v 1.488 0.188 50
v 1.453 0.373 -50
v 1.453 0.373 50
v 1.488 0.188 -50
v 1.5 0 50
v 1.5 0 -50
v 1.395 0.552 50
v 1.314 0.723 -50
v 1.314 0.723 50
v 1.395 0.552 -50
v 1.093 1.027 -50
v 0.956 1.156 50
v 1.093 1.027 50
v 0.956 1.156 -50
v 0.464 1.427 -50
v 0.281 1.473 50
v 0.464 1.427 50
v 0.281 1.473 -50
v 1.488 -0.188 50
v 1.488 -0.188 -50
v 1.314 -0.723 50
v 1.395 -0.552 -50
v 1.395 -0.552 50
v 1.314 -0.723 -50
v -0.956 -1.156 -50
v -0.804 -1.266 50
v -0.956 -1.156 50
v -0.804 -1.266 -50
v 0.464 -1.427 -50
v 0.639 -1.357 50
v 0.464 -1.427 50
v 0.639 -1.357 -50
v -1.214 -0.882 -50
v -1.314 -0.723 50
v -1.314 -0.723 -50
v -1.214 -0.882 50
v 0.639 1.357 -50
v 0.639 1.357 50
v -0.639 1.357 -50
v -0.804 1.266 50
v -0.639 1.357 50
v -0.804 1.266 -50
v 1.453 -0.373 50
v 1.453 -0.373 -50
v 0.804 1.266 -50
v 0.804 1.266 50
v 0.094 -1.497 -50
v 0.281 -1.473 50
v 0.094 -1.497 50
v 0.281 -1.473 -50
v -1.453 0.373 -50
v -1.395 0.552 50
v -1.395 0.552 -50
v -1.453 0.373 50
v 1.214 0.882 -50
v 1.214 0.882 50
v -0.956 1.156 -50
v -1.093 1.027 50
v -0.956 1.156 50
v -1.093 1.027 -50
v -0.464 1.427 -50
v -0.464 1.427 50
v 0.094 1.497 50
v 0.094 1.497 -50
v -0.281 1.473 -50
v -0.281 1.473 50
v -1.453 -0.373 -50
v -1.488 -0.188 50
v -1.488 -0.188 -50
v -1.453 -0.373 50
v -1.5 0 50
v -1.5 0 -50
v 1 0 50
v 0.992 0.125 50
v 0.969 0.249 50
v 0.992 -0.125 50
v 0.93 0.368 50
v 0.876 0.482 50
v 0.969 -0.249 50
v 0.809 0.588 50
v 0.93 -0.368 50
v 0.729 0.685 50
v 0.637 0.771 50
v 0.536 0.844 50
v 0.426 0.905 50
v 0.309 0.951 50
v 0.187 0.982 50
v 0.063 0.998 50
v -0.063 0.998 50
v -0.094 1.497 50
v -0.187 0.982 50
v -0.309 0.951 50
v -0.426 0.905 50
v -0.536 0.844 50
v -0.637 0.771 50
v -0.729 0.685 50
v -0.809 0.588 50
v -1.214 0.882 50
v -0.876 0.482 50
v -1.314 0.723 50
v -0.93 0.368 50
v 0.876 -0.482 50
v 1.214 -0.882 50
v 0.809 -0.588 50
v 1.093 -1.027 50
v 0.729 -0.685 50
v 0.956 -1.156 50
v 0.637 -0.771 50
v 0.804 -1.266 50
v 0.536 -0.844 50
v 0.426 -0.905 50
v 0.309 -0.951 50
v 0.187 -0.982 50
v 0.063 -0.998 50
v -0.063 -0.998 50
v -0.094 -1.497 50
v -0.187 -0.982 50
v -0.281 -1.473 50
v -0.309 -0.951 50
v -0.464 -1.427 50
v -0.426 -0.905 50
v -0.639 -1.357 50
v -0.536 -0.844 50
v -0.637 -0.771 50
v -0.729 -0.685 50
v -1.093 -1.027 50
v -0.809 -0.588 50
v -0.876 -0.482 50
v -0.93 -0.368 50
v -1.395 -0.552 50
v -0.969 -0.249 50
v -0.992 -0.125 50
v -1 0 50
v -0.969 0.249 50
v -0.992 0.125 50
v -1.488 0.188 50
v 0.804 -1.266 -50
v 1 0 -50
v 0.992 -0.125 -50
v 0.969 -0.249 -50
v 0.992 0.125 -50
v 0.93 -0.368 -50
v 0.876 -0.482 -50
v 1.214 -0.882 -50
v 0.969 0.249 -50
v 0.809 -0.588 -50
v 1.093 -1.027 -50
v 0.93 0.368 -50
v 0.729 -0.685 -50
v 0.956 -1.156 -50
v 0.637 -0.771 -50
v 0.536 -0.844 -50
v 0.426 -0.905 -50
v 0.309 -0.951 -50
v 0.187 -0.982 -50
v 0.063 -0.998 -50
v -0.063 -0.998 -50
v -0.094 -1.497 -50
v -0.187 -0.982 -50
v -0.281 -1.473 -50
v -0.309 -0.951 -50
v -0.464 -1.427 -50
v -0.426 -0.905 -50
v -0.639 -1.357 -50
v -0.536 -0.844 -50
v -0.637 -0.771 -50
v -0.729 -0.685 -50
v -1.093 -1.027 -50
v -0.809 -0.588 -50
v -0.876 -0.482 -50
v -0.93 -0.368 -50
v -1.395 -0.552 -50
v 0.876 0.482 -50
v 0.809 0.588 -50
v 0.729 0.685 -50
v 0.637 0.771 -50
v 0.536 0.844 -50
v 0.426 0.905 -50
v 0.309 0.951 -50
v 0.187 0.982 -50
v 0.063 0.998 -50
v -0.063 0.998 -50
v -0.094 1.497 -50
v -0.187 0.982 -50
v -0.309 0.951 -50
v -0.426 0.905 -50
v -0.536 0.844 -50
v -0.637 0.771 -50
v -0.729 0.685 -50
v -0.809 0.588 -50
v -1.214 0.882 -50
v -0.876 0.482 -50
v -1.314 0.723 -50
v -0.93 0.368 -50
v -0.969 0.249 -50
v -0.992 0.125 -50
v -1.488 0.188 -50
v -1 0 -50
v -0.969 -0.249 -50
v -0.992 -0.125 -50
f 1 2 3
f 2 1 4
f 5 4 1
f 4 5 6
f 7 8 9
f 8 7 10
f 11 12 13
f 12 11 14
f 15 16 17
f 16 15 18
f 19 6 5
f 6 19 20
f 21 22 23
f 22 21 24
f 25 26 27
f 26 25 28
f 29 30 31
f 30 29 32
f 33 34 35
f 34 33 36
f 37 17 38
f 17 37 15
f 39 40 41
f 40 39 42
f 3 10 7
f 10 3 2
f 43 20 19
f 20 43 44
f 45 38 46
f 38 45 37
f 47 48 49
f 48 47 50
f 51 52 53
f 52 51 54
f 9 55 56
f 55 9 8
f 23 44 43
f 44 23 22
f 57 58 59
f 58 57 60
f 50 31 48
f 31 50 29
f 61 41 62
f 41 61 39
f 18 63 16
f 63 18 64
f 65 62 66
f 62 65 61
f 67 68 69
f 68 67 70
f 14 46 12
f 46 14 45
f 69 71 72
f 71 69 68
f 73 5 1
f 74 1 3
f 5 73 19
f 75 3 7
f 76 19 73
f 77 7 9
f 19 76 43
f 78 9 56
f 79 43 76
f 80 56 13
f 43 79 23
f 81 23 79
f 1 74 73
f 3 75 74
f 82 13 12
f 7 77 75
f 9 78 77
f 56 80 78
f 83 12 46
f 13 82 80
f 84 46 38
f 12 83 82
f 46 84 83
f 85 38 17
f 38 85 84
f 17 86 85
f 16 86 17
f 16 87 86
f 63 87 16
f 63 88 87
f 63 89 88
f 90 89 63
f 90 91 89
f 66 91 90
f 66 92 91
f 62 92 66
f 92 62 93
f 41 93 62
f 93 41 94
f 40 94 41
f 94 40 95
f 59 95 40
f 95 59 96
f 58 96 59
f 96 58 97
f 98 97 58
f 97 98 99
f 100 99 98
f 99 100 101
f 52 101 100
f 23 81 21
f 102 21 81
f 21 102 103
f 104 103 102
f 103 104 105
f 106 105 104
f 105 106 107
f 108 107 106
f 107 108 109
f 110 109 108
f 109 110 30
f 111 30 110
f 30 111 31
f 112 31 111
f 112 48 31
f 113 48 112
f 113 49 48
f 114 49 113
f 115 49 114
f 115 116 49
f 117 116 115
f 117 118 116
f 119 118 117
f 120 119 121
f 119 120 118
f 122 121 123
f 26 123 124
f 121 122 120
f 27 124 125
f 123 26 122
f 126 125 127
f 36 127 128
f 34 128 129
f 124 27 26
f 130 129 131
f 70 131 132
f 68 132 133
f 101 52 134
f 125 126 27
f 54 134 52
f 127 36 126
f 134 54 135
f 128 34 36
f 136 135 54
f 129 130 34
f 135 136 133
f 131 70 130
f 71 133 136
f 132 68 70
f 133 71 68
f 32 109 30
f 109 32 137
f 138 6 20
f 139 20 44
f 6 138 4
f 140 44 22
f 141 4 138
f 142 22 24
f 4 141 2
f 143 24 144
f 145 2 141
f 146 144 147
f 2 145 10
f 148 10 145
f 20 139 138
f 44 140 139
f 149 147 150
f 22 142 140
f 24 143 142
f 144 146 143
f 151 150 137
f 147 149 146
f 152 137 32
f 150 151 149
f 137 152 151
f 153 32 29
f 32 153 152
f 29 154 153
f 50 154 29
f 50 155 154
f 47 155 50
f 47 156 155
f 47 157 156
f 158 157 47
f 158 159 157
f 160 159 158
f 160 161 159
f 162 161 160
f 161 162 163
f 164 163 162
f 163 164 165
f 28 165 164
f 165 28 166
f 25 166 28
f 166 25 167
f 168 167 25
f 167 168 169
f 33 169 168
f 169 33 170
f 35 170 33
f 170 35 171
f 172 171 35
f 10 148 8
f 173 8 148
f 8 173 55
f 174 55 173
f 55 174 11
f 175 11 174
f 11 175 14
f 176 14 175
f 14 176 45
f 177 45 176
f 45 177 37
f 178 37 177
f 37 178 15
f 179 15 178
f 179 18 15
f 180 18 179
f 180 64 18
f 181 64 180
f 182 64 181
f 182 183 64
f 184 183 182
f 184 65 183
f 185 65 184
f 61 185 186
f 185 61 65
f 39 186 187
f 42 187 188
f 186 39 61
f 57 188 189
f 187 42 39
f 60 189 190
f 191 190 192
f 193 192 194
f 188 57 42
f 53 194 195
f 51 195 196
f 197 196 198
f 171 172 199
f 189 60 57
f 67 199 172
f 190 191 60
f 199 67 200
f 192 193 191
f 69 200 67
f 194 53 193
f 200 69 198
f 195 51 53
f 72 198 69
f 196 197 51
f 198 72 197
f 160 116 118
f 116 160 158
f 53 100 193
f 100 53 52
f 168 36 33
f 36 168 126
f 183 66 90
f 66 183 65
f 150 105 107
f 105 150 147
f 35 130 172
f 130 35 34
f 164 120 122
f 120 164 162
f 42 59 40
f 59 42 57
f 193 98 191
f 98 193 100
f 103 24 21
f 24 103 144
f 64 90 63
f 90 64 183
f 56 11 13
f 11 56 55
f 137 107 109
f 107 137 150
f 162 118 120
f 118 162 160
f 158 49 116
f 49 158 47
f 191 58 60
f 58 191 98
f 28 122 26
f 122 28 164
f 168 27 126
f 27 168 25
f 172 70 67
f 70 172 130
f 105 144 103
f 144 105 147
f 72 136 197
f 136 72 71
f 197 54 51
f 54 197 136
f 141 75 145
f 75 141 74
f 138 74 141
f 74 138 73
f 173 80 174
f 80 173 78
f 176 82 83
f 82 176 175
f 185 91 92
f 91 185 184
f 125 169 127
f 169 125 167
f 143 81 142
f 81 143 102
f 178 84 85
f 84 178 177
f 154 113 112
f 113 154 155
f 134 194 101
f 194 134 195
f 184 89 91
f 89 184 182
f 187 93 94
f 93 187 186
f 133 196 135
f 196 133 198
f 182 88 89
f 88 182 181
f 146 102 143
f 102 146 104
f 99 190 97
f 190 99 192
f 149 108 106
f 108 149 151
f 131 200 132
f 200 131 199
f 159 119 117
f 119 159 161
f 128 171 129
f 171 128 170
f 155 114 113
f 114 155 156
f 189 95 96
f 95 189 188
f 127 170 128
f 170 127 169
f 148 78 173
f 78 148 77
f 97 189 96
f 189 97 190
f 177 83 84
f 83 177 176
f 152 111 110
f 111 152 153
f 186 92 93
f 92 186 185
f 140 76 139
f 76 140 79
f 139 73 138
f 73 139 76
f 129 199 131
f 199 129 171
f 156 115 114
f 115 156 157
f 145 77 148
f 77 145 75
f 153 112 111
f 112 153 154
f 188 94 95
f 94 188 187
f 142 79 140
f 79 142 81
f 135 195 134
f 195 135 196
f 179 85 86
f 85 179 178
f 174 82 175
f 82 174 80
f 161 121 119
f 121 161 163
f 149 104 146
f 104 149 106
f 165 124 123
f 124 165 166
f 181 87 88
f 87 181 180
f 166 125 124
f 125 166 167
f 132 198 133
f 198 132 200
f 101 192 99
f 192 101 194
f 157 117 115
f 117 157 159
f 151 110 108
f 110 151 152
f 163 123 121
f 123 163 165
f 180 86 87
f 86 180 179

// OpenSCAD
$fn = 50;


difference() {
	union() {
		translate(v = [0, 0, -50.0000000000]) {
			cylinder(h = 100, r = 1.5000000000);
		}
	}
	union() {
		translate(v = [0, 0, -100.0000000000]) {
			cylinder(h = 200, r = 1.0000000000);
		}
	}
}
